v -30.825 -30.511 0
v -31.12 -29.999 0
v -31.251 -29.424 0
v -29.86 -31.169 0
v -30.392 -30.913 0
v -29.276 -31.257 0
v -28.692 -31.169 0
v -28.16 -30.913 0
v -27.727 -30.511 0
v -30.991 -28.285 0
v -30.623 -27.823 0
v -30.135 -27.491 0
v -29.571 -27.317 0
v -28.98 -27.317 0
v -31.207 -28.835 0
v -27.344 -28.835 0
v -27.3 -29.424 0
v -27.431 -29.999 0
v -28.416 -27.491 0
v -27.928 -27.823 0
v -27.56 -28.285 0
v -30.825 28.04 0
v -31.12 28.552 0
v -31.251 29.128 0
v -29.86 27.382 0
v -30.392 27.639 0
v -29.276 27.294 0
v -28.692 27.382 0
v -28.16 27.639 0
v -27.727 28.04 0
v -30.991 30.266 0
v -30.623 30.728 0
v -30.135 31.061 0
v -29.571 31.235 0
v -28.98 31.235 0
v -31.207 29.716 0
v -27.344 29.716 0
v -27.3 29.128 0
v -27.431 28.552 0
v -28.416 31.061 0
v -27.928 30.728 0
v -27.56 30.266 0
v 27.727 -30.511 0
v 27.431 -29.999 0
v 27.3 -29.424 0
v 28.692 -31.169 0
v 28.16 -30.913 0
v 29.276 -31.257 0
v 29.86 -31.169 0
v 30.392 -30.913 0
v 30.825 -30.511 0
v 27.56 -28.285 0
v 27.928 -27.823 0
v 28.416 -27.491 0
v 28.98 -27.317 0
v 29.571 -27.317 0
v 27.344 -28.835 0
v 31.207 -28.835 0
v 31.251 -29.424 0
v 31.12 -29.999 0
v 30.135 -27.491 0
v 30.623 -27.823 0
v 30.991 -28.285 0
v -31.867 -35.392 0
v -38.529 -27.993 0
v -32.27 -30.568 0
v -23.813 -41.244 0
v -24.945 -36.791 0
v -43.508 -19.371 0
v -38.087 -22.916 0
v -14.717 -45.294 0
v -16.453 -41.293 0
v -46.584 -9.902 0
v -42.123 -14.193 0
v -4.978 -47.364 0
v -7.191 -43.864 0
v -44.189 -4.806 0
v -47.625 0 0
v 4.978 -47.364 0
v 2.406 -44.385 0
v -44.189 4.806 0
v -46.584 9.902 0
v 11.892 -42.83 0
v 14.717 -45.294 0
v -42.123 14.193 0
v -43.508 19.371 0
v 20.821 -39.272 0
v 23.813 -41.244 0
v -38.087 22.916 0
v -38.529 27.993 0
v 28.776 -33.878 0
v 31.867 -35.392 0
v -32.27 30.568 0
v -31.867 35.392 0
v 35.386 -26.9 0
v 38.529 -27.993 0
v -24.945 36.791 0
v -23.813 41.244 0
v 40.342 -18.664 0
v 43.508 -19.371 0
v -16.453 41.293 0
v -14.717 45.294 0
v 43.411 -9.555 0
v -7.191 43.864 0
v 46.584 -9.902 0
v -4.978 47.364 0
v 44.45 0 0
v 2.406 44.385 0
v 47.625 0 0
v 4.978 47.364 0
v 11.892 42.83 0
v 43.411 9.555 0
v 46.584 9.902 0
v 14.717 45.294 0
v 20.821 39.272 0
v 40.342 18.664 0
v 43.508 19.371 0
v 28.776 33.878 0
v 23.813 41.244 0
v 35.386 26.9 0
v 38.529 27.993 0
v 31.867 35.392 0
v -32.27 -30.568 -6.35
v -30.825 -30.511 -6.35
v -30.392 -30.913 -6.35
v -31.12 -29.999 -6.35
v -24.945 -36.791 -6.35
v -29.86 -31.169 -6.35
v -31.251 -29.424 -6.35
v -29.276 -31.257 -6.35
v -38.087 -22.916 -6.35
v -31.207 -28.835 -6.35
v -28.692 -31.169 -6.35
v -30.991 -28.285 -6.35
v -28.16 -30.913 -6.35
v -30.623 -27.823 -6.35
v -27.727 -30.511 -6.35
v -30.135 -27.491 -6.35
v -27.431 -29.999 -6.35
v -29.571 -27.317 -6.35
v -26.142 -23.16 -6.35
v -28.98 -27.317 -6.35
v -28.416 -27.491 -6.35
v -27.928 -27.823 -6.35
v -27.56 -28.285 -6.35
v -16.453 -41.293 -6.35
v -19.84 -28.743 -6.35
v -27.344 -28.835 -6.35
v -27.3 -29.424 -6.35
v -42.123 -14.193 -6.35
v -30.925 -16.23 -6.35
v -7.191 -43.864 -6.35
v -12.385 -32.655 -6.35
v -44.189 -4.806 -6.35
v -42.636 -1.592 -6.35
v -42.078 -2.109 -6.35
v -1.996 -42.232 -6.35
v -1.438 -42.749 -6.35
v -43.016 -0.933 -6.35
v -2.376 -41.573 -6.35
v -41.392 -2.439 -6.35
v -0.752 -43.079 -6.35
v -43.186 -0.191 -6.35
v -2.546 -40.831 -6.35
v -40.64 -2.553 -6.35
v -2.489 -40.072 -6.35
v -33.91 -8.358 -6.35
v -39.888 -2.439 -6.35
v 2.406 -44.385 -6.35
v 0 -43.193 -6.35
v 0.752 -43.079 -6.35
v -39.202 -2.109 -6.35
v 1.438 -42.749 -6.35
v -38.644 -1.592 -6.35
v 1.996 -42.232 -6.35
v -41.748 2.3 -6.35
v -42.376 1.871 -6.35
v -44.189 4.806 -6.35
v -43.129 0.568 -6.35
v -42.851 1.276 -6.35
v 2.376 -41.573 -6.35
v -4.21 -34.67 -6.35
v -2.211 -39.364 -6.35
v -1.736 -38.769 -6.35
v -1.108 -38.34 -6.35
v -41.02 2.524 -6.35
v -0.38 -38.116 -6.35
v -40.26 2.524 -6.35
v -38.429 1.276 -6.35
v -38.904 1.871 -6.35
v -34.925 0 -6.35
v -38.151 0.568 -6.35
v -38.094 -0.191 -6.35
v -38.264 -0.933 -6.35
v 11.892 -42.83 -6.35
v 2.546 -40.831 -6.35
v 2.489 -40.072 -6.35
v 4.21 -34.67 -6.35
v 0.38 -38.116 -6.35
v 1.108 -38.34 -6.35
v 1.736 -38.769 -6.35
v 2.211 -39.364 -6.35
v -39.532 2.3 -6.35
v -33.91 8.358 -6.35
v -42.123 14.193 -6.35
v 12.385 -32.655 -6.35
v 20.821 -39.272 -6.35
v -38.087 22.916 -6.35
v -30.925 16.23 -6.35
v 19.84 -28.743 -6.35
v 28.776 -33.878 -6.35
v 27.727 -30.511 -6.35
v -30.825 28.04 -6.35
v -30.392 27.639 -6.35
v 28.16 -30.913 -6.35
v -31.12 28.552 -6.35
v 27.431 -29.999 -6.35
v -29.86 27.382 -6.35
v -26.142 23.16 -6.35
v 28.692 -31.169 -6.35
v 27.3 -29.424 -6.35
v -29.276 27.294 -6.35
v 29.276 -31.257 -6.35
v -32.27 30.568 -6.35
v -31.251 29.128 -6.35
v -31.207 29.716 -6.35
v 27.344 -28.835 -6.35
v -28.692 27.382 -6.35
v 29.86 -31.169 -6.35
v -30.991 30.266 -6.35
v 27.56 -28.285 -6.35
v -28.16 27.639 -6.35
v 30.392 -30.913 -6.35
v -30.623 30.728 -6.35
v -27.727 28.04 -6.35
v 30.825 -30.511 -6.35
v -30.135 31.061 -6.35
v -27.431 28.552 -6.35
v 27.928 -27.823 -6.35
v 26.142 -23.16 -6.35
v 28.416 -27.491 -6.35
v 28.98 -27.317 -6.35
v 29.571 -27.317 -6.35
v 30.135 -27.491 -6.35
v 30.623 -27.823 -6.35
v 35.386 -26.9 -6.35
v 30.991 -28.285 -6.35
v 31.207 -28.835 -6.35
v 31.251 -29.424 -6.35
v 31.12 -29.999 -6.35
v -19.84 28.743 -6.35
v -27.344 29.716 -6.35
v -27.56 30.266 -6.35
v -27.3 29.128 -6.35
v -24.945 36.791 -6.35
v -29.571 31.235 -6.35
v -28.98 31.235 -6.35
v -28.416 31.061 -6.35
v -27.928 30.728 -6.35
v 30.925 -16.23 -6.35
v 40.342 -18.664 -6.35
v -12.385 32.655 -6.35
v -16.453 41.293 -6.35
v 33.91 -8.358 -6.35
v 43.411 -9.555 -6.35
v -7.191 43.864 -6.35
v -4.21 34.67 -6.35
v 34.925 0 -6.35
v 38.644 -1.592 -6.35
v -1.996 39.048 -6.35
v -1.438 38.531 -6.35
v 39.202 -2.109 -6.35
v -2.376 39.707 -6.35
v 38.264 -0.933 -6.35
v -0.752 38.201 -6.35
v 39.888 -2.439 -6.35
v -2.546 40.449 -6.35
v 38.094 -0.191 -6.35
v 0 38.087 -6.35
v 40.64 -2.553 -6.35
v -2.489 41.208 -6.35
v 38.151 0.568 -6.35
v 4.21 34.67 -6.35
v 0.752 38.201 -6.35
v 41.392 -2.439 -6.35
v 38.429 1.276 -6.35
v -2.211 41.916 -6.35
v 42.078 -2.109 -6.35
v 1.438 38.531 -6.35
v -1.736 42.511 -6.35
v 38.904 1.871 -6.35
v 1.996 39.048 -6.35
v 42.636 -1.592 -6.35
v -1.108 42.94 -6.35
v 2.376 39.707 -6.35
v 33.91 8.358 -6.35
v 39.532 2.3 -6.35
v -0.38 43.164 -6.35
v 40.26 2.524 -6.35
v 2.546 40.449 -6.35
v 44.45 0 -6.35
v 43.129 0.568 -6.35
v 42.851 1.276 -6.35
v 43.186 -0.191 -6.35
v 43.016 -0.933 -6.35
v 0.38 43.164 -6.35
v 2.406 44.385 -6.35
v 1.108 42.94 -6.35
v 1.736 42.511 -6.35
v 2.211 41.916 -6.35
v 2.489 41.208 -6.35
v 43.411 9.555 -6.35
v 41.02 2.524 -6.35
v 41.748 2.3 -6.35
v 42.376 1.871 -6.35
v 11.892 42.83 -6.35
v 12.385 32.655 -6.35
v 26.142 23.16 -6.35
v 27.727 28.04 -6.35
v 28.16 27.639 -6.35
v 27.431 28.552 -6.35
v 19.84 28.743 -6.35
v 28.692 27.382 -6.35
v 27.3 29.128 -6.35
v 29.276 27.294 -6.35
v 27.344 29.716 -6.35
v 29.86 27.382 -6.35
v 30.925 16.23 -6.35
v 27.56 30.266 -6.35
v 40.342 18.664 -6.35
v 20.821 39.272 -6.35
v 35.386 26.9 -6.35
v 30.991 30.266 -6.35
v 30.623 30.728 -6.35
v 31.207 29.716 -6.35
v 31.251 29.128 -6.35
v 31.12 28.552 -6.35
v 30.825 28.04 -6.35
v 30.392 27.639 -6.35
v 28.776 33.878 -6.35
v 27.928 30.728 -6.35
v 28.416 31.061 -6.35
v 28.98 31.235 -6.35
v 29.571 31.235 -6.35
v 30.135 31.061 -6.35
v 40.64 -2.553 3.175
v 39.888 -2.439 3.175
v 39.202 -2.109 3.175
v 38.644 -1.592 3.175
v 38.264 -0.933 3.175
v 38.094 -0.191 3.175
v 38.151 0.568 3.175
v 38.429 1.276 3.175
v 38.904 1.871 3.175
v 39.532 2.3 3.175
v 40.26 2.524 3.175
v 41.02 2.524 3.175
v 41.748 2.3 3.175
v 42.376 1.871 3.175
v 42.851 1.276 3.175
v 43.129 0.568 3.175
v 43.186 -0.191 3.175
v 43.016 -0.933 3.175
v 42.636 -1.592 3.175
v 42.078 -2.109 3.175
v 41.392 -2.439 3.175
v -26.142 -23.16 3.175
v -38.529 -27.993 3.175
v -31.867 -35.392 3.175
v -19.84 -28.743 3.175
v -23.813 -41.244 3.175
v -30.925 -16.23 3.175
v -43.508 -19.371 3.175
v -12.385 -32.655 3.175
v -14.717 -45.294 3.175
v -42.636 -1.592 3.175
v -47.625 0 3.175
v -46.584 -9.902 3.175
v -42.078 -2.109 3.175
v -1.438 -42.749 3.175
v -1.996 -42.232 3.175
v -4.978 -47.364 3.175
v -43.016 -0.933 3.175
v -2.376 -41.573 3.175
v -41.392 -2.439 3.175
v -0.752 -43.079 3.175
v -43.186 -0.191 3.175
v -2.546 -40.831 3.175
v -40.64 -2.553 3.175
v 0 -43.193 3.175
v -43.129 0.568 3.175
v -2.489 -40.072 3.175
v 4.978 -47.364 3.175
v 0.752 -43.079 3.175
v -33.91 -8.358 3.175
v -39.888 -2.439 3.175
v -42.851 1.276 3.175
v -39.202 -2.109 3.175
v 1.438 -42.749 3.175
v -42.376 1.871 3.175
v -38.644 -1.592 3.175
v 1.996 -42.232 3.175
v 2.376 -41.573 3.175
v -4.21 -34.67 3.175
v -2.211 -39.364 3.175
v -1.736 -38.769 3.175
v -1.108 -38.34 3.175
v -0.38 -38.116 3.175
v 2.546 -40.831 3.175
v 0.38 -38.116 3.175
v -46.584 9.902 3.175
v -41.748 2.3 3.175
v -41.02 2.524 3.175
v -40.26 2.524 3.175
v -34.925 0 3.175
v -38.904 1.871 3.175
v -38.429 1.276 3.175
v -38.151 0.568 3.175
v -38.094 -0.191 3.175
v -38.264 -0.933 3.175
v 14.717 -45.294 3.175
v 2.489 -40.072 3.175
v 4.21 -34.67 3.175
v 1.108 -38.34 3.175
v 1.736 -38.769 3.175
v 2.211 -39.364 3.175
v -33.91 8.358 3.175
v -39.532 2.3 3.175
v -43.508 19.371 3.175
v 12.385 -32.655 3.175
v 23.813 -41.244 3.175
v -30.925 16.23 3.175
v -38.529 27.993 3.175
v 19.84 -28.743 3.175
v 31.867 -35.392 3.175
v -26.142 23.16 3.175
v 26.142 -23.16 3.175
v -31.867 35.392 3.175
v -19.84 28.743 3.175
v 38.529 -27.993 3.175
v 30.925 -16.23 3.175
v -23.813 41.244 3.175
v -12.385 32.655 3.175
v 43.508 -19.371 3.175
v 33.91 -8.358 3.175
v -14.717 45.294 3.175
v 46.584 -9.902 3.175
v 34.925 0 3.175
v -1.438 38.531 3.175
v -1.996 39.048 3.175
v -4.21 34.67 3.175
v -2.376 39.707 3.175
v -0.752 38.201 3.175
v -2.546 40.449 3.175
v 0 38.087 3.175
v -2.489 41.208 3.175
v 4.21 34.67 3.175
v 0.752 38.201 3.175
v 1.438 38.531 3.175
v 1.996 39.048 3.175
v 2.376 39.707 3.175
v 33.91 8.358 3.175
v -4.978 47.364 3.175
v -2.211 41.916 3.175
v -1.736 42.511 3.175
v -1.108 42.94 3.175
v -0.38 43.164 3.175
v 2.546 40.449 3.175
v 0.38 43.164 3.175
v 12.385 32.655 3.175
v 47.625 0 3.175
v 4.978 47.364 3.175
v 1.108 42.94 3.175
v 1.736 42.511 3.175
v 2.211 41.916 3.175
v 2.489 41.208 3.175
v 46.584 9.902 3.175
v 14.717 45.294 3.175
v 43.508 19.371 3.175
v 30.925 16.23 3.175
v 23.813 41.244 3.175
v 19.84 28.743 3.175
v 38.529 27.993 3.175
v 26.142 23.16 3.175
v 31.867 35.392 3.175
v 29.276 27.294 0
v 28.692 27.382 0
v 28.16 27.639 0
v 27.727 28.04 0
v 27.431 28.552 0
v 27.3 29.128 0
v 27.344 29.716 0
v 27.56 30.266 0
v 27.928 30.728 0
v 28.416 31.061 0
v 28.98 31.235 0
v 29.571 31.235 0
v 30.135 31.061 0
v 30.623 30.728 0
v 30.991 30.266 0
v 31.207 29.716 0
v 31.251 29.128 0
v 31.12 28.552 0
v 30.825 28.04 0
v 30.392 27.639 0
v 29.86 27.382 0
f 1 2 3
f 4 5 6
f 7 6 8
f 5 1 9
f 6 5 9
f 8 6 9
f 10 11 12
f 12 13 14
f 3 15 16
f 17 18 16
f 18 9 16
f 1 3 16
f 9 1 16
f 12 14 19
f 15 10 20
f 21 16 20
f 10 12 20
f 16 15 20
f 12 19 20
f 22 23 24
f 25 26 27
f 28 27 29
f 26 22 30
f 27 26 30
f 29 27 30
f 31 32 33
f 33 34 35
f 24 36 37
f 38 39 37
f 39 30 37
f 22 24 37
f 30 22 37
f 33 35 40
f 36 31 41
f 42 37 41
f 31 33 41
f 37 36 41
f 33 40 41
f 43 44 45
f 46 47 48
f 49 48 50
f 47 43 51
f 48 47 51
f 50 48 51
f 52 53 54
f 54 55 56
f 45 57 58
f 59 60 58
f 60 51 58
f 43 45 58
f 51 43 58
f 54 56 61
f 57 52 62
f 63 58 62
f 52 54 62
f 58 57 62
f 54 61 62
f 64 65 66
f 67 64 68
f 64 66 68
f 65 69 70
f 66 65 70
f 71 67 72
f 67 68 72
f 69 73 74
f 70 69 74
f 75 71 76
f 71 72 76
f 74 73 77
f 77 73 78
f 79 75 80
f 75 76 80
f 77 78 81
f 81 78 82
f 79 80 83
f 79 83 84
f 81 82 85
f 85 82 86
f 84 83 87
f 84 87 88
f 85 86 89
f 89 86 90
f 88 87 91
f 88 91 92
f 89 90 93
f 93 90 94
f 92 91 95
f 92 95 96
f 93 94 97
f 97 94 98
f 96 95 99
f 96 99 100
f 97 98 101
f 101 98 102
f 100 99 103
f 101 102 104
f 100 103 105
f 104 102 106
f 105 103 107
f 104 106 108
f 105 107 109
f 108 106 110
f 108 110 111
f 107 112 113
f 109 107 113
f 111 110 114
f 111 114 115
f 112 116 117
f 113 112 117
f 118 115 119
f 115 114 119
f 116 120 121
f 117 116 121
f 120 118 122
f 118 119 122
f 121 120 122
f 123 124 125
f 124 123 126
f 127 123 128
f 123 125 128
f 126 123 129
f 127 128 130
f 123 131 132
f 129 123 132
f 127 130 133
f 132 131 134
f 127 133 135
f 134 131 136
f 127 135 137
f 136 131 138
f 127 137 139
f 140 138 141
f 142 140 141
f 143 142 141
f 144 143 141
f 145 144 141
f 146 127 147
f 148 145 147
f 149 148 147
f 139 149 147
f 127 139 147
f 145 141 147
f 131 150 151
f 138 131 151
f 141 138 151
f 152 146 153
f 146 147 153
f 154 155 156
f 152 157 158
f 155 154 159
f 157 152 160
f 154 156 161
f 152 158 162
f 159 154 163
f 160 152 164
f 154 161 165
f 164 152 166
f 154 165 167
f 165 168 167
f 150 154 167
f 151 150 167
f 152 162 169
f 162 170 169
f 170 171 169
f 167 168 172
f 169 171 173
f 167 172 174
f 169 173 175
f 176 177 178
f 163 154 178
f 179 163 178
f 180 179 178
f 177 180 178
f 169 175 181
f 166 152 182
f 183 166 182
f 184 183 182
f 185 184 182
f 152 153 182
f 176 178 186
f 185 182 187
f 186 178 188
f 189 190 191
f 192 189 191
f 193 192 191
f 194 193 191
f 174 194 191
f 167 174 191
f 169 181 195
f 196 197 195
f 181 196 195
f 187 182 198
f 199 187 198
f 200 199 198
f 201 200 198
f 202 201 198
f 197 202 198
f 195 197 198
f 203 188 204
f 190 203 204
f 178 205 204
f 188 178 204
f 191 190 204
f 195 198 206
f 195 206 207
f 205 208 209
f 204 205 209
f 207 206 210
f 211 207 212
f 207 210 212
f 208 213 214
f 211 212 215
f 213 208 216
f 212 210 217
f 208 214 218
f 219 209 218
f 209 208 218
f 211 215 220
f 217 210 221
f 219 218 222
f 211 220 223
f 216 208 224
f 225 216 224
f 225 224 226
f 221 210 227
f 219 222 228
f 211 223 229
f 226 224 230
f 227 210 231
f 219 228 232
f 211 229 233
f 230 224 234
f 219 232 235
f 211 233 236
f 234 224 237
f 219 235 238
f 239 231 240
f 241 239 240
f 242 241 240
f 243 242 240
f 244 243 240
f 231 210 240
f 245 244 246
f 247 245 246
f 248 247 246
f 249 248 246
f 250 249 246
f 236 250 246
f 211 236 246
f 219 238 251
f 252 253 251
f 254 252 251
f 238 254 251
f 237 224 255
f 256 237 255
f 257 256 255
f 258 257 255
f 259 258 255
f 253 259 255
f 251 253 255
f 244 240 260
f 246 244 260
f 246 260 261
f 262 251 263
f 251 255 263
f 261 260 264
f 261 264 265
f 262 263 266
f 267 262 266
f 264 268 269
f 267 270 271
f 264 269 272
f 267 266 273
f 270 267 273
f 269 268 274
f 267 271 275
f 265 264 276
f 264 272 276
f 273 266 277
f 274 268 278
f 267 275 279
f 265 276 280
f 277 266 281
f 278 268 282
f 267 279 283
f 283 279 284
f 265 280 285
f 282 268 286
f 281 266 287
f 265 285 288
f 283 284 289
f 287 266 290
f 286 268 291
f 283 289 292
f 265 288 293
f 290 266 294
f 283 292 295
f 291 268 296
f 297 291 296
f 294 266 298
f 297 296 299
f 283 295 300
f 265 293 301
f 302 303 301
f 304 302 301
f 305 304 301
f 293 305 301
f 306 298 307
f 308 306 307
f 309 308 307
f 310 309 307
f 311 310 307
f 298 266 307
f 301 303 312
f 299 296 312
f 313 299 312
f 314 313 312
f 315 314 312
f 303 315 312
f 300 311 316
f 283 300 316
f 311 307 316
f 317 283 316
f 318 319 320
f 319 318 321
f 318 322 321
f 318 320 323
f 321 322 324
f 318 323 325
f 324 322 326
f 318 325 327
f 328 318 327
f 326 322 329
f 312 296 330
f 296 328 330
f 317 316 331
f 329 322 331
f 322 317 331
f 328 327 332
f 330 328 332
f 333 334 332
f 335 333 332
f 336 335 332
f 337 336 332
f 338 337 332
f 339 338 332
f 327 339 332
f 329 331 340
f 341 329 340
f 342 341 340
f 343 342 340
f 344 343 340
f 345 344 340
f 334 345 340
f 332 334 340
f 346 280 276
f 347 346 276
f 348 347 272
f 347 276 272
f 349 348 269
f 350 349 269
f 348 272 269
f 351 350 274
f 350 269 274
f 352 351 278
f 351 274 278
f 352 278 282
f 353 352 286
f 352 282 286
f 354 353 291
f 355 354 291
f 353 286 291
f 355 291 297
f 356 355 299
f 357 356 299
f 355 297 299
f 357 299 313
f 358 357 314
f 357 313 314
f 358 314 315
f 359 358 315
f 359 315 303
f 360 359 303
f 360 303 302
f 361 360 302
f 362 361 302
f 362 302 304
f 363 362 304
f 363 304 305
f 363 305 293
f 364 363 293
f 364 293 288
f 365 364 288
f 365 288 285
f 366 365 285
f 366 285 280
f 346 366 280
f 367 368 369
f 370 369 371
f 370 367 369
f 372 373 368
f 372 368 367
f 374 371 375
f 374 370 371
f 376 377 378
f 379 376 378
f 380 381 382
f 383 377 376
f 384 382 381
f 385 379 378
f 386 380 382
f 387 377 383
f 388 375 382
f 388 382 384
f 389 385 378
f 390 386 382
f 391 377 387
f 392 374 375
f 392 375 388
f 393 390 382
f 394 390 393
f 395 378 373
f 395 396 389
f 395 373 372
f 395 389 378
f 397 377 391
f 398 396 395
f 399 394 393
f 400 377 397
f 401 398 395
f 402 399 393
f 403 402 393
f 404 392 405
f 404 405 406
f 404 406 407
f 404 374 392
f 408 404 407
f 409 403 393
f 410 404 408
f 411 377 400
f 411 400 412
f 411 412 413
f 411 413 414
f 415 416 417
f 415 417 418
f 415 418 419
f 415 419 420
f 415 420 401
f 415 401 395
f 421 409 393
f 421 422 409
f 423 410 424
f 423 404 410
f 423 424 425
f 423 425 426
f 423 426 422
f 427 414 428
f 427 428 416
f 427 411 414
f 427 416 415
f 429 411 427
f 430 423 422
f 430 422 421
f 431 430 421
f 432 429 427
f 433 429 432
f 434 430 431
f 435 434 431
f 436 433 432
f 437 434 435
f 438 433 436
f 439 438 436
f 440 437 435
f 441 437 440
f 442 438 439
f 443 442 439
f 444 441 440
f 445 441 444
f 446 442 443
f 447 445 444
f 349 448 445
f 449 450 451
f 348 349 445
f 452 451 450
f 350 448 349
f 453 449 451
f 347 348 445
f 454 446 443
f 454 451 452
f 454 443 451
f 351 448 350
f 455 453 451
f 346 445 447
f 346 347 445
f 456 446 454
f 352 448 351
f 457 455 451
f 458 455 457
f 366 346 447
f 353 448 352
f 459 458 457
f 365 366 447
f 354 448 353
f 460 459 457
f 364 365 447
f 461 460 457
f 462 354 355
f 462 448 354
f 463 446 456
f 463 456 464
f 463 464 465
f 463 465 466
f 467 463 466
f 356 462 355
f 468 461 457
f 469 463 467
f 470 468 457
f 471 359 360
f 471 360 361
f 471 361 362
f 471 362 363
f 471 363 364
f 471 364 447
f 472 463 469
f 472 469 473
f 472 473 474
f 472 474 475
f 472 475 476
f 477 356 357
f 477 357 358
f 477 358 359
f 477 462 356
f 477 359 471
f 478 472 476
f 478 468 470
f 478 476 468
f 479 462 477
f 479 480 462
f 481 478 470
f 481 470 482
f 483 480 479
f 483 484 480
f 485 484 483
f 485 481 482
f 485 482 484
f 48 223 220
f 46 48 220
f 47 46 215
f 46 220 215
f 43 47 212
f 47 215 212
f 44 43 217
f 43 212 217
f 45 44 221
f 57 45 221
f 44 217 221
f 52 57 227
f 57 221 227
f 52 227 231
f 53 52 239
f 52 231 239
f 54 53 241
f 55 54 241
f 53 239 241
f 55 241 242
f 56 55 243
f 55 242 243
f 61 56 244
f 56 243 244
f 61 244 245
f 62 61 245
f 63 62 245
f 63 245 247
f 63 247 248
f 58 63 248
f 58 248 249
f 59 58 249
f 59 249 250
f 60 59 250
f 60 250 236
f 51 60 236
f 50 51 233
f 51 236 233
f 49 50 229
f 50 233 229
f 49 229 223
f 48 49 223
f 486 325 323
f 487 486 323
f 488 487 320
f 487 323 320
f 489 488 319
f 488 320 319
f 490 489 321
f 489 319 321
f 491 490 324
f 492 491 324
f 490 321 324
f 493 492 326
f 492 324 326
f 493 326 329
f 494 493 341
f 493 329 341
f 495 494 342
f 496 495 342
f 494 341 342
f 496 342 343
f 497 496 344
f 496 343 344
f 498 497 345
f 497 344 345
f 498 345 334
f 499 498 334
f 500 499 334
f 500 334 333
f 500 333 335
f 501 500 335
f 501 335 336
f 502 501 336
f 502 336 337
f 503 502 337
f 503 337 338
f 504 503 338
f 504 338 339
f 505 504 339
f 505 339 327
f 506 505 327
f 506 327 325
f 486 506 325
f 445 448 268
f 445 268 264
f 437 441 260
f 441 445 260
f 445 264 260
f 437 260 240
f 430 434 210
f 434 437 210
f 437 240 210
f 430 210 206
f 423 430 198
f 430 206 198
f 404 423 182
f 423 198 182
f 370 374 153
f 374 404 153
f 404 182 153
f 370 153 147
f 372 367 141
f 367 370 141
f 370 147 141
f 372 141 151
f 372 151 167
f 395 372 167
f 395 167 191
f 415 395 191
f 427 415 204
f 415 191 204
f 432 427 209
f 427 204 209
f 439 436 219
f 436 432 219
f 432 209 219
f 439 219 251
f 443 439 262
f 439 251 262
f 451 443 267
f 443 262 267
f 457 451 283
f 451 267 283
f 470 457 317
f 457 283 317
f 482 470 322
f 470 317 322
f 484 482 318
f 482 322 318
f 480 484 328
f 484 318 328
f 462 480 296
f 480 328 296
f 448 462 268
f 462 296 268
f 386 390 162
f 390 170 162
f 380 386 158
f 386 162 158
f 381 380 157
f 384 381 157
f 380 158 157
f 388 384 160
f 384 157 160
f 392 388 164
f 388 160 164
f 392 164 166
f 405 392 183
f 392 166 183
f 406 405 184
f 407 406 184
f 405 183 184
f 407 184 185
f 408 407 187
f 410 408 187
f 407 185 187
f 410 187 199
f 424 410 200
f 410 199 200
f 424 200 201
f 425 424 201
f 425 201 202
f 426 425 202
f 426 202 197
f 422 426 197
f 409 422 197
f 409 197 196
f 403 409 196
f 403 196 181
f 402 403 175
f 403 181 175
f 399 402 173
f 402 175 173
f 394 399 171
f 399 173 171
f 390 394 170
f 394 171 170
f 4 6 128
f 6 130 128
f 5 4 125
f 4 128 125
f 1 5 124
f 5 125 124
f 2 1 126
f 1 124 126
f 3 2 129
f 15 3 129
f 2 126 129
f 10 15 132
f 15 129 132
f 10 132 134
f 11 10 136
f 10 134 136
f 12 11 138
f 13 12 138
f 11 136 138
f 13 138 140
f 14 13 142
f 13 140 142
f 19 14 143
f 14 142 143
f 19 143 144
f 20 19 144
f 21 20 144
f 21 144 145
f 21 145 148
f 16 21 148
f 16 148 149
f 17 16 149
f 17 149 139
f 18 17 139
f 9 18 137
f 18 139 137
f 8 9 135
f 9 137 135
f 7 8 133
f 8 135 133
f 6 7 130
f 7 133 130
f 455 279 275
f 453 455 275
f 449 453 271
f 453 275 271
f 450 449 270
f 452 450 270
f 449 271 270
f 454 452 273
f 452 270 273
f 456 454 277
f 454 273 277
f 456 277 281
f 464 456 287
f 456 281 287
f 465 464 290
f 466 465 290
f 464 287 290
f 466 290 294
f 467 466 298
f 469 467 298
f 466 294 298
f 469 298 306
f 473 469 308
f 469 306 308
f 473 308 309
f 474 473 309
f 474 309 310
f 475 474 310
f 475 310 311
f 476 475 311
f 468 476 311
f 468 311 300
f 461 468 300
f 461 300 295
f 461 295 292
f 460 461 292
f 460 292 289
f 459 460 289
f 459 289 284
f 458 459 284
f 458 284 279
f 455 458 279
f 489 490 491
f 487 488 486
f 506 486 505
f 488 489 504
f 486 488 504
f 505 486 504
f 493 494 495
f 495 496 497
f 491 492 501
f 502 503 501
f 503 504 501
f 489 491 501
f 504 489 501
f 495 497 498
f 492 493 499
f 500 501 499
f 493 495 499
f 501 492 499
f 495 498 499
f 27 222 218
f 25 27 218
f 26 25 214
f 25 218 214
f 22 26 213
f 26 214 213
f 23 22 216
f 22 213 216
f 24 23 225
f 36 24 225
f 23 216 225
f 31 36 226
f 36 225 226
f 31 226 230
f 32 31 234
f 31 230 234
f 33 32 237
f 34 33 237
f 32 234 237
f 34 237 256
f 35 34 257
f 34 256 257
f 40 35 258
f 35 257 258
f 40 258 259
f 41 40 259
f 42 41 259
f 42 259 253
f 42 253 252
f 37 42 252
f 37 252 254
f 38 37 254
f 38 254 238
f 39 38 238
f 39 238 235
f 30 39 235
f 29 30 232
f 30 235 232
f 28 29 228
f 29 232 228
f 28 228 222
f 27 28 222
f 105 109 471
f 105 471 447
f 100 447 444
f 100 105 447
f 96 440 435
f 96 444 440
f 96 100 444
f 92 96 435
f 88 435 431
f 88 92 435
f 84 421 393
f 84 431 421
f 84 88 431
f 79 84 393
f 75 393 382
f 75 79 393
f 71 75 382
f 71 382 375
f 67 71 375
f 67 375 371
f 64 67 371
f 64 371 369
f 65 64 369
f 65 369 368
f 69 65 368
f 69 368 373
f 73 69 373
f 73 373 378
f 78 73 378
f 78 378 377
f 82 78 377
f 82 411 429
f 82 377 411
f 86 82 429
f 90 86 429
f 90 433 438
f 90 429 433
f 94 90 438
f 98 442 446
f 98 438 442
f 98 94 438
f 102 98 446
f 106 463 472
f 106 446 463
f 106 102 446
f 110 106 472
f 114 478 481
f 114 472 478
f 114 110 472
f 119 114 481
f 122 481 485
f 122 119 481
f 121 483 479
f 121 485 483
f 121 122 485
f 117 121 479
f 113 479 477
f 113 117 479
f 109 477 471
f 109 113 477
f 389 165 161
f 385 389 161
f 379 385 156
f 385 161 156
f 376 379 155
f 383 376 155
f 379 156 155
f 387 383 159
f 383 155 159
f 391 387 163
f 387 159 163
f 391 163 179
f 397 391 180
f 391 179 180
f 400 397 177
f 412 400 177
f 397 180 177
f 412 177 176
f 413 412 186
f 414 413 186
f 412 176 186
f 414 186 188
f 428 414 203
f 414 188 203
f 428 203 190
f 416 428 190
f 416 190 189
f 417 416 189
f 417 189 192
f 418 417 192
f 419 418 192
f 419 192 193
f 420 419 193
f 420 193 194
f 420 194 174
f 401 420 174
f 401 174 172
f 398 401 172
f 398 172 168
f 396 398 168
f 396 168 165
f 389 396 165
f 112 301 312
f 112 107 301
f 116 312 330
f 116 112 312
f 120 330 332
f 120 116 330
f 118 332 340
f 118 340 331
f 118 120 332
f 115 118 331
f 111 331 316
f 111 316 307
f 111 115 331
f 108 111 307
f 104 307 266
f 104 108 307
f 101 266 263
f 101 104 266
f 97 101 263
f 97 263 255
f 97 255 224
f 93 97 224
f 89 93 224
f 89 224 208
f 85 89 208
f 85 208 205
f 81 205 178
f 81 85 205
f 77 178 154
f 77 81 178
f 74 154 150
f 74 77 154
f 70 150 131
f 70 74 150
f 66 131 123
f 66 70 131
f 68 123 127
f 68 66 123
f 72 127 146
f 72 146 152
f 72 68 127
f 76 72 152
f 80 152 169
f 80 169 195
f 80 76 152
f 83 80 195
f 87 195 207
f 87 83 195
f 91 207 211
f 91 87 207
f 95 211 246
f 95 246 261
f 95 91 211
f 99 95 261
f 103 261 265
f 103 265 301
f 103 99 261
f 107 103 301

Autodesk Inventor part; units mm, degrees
ref_plane "YZ Plane" through (0, 0, 0) normal (1, 0, 0) x (0, 1, 0)
ref_plane "XZ Plane" through (0, 0, 0) normal (0, 1, 0) x (-1, 0, 0)
ref_plane "XY Plane" through (0, 0, 0) normal (0, 0, 1) x (1, 0, 0)
sketch "Sketch1" plane through (0, 0, 0) normal (0, 0, 1) x (1, 0, 0)
  circle A0 centre (0, 0) radius 44.45
  circle A1 centre (0, 0) radius 34.925
  dimension "d0" = 88.9
  dimension "d20" = 69.85
extrude "Extrusion1" add sketch "Sketch1" against normal blind 6.35
sketch "Sketch3" plane through (0, 0, 0) normal (0, 0, 1) x (1, 0, 0)
  circle A0 centre (0, 0) radius 41.402 construction
  line L0 (0, 0) -> (29.2756, 29.2756) construction
  circle A1 centre (0, 0) radius 44.45 construction
  line L1 (-44.45, 0) -> (44.45, 0) construction
  point P0 (-29.2756, 29.2756)
  point P1 (-29.2756, -29.2756)
  point P2 (29.2756, -29.2756)
  dimension "d4" = 82.804
  dimension "d5" = 45
  dimension "d8" = 360
hole "Hole1" at (29.2756, 29.2756, 0) at (-29.2756, 29.2756, 0) at (-29.2756, -29.2756, 0) at (29.2756, -29.2756, 0) direction (0, 0, -1) diameter 3.9624 end through all thread size "10-32 UNF" class "2B" standard "ANSI Unified Screw Threads"
sketch "Sketch7" plane through (0, 0, 0) normal (0, 0, 1) x (1, 0, 0)
  circle A0 centre (0, 0) radius 34.925 projected
  circle A1 centre (0, 0) radius 47.625
  dimension "d25" = 95.25
extrude "Extrusion4" add sketch "Sketch7" along normal blind 3.175
sketch "Sketch8" plane through (0, 0, 3.175) normal (0, 0, 1) x (1, 0, 0)
  circle A0 centre (0, 0) radius 40.64 construction
  point P0 (40.64, 0)
  point P1 (0, 40.64)
  point P2 (-40.64, 0)
  point P3 (0, -40.64)
  dimension "d28" = 81.28
  dimension "d38" = 360
hole "Hole2" at (0, 40.64, 3.175) at (-40.64, 0, 3.175) at (0, -40.64, 3.175) at (40.64, 0, 3.175) direction (0, 0, -1) diameter 5.1054 end through all
properties part number "LS-002" material "Aluminum 6061"
